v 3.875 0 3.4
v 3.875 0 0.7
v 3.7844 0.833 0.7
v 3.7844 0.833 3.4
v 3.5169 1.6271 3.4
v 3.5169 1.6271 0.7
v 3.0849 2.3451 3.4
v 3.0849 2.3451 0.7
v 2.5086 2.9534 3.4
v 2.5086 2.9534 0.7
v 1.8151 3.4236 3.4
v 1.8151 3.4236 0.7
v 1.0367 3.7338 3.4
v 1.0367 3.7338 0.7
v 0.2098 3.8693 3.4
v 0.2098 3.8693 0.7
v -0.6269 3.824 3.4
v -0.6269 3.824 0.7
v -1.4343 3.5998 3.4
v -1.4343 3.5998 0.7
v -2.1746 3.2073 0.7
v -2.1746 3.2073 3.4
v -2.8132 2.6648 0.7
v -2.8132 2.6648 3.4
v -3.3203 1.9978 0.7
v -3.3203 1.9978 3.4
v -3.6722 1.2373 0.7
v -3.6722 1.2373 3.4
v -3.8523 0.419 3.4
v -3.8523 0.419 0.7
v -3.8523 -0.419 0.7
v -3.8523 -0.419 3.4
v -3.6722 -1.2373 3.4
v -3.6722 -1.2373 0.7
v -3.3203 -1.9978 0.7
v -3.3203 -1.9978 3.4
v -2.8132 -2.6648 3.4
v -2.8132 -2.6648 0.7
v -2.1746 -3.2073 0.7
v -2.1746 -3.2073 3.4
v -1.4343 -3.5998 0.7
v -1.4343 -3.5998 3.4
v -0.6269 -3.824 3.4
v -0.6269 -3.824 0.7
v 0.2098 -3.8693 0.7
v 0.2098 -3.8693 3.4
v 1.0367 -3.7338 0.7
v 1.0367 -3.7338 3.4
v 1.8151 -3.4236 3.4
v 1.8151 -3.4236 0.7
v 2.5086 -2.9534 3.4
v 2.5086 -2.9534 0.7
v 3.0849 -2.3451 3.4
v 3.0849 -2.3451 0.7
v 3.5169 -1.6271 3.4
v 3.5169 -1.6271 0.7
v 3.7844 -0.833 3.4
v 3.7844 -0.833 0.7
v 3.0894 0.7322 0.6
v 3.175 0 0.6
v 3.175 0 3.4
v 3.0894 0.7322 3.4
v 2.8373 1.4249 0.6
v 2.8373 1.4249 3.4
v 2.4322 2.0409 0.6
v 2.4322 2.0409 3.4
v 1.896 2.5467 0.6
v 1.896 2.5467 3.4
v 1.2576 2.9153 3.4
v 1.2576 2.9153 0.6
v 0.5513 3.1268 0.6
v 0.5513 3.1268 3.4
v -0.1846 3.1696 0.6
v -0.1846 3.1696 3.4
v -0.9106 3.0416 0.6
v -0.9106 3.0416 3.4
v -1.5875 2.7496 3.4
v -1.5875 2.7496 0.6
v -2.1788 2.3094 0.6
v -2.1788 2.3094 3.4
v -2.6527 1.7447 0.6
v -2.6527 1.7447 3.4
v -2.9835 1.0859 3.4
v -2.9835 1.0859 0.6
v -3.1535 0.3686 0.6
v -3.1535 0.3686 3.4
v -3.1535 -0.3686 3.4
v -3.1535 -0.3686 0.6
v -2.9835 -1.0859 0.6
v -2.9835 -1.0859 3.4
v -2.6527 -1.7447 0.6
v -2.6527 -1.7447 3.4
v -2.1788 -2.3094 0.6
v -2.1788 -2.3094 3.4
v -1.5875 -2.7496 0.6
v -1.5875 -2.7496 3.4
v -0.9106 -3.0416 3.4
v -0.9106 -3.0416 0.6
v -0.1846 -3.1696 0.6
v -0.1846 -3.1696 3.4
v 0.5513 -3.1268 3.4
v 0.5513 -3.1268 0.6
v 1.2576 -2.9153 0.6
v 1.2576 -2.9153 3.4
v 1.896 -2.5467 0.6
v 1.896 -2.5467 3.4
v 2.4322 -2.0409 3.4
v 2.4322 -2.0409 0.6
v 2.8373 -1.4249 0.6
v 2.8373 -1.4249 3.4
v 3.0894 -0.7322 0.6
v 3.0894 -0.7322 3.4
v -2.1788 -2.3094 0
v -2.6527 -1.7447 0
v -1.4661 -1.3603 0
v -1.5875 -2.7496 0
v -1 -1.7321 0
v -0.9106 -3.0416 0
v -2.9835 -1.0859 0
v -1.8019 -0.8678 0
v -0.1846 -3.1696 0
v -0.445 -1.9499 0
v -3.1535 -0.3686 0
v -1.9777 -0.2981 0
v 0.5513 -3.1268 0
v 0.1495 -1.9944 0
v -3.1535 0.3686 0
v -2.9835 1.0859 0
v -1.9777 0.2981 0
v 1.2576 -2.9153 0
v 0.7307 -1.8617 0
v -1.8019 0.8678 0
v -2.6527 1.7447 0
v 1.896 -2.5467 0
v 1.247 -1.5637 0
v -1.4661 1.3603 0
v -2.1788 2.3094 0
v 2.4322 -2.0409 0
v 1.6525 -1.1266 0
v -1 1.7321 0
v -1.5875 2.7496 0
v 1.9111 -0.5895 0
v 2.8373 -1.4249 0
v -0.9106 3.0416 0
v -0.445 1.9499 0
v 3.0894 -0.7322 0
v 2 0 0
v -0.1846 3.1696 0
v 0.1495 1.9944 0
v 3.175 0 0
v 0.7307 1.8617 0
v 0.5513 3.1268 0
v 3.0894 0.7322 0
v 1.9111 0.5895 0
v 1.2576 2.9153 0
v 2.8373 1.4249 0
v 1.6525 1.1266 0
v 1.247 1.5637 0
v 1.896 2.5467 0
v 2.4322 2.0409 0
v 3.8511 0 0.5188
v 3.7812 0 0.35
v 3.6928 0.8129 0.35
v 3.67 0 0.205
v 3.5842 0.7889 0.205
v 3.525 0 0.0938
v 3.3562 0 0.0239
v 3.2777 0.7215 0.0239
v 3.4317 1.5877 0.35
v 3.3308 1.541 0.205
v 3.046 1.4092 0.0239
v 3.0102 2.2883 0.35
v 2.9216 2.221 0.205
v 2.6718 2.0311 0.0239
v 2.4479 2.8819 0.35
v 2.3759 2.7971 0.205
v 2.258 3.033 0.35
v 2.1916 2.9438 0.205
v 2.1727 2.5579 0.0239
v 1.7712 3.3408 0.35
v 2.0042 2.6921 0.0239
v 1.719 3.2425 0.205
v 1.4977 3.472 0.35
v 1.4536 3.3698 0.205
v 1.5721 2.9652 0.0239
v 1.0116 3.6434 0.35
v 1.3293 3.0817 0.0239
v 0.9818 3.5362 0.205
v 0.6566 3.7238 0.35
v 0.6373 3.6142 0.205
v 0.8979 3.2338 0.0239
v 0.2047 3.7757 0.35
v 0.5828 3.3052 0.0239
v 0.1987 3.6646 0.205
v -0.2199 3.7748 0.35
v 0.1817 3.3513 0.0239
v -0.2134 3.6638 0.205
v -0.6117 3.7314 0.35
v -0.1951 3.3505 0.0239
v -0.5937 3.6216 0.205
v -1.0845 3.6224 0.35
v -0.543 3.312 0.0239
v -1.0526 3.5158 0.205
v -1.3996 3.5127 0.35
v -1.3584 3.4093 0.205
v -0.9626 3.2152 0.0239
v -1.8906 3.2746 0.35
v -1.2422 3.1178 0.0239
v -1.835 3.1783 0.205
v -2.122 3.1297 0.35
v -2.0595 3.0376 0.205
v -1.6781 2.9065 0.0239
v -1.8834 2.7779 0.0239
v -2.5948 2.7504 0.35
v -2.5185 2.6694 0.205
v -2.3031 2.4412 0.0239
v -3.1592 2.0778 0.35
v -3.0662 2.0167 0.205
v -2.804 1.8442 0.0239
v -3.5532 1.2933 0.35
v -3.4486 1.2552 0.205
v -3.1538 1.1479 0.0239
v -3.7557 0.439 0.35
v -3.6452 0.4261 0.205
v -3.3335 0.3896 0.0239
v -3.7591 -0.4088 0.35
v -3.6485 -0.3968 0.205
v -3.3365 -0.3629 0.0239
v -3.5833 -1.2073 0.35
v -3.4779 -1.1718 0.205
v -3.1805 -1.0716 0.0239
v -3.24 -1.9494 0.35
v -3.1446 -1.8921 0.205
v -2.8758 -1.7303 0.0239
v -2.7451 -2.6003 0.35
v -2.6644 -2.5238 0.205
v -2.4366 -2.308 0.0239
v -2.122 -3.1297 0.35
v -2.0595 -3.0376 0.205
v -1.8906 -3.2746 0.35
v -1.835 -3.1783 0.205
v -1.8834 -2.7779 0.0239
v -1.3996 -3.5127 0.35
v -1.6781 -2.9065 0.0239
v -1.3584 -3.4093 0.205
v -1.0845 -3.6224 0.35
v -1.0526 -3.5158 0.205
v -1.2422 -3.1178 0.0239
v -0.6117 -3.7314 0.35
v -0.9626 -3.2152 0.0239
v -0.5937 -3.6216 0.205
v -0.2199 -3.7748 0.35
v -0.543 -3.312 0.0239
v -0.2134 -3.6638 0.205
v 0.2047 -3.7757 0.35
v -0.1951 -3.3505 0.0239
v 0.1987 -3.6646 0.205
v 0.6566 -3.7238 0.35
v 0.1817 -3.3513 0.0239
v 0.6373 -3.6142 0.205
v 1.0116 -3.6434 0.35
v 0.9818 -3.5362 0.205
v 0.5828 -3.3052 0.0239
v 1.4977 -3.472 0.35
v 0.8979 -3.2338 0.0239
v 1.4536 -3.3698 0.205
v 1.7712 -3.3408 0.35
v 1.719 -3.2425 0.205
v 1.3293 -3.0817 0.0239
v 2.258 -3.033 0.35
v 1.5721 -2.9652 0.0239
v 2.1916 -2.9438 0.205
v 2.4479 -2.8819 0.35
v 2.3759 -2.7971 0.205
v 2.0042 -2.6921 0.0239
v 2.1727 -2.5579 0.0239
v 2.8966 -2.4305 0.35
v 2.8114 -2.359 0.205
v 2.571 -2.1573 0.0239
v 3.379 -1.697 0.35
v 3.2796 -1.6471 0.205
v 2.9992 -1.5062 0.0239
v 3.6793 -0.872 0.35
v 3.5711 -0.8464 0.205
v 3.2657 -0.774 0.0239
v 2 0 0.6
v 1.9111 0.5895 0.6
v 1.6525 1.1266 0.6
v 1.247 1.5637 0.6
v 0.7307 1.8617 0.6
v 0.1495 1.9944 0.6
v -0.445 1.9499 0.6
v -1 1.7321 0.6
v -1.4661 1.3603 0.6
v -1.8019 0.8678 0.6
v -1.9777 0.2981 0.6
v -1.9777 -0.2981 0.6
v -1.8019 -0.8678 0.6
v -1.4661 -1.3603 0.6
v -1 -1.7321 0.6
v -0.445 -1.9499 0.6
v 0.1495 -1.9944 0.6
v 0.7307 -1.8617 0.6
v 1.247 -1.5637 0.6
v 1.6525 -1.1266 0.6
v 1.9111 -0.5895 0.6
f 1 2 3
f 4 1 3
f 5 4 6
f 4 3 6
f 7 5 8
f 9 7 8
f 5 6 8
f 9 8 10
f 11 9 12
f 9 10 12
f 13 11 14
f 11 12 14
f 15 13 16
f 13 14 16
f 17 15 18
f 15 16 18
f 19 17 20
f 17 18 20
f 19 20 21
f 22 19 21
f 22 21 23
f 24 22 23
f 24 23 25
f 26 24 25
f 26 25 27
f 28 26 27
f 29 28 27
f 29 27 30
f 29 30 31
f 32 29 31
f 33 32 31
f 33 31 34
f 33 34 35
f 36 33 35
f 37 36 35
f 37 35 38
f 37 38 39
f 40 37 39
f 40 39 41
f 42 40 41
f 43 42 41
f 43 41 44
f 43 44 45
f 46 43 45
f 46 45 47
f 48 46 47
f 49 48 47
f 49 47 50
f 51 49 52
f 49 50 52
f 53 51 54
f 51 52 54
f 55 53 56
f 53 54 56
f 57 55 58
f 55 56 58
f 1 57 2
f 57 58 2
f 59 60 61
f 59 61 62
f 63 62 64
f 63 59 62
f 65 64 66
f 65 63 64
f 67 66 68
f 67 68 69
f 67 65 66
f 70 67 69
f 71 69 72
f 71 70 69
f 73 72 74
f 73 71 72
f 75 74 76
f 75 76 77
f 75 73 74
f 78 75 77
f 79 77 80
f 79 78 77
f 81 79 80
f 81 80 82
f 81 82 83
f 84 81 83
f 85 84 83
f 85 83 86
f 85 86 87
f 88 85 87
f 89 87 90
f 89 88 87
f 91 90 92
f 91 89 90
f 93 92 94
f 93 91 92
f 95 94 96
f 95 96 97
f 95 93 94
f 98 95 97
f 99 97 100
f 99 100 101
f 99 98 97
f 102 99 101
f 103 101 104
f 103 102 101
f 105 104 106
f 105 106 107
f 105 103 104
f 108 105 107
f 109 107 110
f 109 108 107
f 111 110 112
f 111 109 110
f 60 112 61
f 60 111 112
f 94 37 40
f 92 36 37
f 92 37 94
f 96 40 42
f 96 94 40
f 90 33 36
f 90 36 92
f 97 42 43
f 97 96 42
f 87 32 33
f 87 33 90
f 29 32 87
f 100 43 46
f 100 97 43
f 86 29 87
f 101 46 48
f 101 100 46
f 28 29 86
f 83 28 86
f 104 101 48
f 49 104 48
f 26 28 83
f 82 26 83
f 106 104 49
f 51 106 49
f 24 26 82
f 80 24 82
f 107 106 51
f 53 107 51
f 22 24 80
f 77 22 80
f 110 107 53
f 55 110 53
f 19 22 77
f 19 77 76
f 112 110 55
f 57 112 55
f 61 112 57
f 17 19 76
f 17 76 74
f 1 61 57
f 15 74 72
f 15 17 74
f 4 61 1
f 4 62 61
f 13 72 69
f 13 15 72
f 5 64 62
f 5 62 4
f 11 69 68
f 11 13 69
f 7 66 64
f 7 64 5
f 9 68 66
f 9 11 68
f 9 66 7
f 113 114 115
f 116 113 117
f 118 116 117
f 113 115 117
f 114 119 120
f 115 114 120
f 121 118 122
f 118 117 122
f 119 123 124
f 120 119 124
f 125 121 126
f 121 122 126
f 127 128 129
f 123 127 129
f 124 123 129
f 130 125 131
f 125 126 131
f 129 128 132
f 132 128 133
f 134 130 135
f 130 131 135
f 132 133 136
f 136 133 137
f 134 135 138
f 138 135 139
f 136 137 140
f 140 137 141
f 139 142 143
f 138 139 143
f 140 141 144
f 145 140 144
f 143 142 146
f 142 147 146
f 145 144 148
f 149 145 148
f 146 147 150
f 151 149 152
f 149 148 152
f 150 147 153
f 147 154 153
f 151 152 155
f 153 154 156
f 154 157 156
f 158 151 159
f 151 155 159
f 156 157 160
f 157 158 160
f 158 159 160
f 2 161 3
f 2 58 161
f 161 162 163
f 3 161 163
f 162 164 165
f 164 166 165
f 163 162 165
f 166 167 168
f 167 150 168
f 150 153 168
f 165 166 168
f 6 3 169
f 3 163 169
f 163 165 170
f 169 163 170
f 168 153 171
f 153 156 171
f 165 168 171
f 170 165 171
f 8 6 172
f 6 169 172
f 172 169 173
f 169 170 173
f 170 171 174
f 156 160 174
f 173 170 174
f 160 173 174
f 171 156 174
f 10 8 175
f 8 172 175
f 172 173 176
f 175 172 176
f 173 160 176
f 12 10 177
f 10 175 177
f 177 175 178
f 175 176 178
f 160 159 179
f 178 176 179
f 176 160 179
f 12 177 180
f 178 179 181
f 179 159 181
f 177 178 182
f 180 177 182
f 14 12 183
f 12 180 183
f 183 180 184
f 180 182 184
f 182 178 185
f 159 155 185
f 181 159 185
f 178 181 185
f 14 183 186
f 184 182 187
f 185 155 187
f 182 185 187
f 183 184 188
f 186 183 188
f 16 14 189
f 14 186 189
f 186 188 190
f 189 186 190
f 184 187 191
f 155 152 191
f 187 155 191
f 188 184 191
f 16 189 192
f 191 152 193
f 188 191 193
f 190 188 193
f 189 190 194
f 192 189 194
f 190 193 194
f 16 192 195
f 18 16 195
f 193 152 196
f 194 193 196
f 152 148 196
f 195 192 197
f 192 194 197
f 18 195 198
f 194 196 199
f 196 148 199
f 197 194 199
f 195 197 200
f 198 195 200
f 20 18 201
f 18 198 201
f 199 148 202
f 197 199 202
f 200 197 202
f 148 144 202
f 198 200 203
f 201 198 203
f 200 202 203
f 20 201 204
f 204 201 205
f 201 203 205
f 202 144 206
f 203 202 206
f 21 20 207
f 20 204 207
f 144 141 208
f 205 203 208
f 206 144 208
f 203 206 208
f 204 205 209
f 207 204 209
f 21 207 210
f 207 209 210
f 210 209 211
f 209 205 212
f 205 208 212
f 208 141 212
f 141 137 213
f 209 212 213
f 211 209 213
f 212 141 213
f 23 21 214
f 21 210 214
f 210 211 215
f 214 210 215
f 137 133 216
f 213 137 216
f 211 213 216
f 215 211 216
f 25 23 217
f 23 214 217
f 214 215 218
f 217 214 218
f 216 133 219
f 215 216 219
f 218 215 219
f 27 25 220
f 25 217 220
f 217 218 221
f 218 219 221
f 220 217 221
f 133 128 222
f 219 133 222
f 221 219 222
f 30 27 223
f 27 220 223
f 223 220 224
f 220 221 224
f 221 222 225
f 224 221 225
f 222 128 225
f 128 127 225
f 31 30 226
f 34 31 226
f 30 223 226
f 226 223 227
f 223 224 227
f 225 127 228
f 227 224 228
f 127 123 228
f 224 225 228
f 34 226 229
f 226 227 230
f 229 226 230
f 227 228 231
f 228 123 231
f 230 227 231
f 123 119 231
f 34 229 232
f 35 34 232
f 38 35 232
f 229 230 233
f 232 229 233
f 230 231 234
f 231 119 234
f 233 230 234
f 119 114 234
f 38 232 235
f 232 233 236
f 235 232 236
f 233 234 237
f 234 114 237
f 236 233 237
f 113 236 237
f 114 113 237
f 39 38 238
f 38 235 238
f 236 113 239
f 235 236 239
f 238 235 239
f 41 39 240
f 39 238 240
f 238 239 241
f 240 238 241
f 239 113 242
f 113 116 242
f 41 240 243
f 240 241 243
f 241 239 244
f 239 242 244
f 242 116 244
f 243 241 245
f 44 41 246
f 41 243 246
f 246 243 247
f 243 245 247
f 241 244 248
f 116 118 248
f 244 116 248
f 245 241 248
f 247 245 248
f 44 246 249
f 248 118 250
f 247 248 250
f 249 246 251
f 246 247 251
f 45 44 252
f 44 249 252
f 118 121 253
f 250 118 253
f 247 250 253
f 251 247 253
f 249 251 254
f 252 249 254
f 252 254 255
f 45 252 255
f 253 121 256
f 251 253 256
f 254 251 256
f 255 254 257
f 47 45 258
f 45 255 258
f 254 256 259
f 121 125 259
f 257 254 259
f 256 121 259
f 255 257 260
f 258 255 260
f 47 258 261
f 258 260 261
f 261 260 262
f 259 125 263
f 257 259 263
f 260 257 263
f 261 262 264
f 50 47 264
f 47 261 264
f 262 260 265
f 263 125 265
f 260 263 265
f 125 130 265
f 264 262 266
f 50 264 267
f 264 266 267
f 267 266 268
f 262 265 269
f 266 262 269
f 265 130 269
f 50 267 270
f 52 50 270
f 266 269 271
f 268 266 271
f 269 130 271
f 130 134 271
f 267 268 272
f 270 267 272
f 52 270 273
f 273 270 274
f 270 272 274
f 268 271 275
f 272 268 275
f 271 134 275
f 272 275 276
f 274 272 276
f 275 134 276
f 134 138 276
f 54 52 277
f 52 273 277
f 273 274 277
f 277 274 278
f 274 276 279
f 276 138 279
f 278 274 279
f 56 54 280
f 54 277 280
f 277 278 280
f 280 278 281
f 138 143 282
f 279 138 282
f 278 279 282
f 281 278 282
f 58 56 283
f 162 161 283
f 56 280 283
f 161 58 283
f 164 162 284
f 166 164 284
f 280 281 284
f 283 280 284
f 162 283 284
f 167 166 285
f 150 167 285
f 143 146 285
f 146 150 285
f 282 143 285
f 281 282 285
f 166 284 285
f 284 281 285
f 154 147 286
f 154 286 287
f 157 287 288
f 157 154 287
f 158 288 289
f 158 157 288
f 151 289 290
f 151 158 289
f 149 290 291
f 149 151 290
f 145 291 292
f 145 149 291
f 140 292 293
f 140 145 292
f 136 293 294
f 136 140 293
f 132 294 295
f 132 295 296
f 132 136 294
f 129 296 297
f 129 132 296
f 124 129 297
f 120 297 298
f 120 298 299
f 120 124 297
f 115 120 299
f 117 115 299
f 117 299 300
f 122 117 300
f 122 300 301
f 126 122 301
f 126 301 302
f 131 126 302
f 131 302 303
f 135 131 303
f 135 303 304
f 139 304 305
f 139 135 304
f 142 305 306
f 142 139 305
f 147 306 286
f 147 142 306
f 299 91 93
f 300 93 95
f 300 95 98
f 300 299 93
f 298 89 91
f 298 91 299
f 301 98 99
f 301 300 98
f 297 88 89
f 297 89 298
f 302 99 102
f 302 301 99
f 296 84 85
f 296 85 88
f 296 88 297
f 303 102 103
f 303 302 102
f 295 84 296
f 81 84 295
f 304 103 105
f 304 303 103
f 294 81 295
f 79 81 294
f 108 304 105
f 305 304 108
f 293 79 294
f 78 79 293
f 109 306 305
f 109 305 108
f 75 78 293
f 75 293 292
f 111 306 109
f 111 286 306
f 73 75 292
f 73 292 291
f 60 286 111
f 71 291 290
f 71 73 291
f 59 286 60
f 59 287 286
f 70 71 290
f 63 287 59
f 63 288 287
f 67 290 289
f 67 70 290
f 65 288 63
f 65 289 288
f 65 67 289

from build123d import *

# Parameters (mm, degrees)
SKETCH1_R           = 3.875
SKETCH1_R_2         = 2
BOSS_EXTRUDE1_DEPTH = 0.6
SKETCH2_R           = 3.875
SKETCH2_R_2         = 3.175
BOSS_EXTRUDE2_DEPTH = 2.8
FILLET1_R           = 0.7


with BuildPart() as part:
    # Sketch1 → Boss-Extrude1 (new body)
    with BuildSketch(Plane(origin=(0, 0, 0), x_dir=(0, 1, 0), z_dir=(0, 0, 1))):
        Circle(SKETCH1_R)
        Circle(SKETCH1_R_2, mode=Mode.SUBTRACT)
    extrude(amount=BOSS_EXTRUDE1_DEPTH)

    # Sketch2 → Boss-Extrude2 (add)
    with BuildSketch(Plane.XY.offset(0.6)):
        Circle(SKETCH2_R)
        Circle(SKETCH2_R_2, mode=Mode.SUBTRACT)
    extrude(amount=BOSS_EXTRUDE2_DEPTH)

    # Fillet1
    fillet1_edges = [part.edges().sort_by_distance(p)[0] for p in [
        (0, -3.875, 0),
    ]]
    fillet(fillet1_edges, radius=FILLET1_R)


solid = part.part
